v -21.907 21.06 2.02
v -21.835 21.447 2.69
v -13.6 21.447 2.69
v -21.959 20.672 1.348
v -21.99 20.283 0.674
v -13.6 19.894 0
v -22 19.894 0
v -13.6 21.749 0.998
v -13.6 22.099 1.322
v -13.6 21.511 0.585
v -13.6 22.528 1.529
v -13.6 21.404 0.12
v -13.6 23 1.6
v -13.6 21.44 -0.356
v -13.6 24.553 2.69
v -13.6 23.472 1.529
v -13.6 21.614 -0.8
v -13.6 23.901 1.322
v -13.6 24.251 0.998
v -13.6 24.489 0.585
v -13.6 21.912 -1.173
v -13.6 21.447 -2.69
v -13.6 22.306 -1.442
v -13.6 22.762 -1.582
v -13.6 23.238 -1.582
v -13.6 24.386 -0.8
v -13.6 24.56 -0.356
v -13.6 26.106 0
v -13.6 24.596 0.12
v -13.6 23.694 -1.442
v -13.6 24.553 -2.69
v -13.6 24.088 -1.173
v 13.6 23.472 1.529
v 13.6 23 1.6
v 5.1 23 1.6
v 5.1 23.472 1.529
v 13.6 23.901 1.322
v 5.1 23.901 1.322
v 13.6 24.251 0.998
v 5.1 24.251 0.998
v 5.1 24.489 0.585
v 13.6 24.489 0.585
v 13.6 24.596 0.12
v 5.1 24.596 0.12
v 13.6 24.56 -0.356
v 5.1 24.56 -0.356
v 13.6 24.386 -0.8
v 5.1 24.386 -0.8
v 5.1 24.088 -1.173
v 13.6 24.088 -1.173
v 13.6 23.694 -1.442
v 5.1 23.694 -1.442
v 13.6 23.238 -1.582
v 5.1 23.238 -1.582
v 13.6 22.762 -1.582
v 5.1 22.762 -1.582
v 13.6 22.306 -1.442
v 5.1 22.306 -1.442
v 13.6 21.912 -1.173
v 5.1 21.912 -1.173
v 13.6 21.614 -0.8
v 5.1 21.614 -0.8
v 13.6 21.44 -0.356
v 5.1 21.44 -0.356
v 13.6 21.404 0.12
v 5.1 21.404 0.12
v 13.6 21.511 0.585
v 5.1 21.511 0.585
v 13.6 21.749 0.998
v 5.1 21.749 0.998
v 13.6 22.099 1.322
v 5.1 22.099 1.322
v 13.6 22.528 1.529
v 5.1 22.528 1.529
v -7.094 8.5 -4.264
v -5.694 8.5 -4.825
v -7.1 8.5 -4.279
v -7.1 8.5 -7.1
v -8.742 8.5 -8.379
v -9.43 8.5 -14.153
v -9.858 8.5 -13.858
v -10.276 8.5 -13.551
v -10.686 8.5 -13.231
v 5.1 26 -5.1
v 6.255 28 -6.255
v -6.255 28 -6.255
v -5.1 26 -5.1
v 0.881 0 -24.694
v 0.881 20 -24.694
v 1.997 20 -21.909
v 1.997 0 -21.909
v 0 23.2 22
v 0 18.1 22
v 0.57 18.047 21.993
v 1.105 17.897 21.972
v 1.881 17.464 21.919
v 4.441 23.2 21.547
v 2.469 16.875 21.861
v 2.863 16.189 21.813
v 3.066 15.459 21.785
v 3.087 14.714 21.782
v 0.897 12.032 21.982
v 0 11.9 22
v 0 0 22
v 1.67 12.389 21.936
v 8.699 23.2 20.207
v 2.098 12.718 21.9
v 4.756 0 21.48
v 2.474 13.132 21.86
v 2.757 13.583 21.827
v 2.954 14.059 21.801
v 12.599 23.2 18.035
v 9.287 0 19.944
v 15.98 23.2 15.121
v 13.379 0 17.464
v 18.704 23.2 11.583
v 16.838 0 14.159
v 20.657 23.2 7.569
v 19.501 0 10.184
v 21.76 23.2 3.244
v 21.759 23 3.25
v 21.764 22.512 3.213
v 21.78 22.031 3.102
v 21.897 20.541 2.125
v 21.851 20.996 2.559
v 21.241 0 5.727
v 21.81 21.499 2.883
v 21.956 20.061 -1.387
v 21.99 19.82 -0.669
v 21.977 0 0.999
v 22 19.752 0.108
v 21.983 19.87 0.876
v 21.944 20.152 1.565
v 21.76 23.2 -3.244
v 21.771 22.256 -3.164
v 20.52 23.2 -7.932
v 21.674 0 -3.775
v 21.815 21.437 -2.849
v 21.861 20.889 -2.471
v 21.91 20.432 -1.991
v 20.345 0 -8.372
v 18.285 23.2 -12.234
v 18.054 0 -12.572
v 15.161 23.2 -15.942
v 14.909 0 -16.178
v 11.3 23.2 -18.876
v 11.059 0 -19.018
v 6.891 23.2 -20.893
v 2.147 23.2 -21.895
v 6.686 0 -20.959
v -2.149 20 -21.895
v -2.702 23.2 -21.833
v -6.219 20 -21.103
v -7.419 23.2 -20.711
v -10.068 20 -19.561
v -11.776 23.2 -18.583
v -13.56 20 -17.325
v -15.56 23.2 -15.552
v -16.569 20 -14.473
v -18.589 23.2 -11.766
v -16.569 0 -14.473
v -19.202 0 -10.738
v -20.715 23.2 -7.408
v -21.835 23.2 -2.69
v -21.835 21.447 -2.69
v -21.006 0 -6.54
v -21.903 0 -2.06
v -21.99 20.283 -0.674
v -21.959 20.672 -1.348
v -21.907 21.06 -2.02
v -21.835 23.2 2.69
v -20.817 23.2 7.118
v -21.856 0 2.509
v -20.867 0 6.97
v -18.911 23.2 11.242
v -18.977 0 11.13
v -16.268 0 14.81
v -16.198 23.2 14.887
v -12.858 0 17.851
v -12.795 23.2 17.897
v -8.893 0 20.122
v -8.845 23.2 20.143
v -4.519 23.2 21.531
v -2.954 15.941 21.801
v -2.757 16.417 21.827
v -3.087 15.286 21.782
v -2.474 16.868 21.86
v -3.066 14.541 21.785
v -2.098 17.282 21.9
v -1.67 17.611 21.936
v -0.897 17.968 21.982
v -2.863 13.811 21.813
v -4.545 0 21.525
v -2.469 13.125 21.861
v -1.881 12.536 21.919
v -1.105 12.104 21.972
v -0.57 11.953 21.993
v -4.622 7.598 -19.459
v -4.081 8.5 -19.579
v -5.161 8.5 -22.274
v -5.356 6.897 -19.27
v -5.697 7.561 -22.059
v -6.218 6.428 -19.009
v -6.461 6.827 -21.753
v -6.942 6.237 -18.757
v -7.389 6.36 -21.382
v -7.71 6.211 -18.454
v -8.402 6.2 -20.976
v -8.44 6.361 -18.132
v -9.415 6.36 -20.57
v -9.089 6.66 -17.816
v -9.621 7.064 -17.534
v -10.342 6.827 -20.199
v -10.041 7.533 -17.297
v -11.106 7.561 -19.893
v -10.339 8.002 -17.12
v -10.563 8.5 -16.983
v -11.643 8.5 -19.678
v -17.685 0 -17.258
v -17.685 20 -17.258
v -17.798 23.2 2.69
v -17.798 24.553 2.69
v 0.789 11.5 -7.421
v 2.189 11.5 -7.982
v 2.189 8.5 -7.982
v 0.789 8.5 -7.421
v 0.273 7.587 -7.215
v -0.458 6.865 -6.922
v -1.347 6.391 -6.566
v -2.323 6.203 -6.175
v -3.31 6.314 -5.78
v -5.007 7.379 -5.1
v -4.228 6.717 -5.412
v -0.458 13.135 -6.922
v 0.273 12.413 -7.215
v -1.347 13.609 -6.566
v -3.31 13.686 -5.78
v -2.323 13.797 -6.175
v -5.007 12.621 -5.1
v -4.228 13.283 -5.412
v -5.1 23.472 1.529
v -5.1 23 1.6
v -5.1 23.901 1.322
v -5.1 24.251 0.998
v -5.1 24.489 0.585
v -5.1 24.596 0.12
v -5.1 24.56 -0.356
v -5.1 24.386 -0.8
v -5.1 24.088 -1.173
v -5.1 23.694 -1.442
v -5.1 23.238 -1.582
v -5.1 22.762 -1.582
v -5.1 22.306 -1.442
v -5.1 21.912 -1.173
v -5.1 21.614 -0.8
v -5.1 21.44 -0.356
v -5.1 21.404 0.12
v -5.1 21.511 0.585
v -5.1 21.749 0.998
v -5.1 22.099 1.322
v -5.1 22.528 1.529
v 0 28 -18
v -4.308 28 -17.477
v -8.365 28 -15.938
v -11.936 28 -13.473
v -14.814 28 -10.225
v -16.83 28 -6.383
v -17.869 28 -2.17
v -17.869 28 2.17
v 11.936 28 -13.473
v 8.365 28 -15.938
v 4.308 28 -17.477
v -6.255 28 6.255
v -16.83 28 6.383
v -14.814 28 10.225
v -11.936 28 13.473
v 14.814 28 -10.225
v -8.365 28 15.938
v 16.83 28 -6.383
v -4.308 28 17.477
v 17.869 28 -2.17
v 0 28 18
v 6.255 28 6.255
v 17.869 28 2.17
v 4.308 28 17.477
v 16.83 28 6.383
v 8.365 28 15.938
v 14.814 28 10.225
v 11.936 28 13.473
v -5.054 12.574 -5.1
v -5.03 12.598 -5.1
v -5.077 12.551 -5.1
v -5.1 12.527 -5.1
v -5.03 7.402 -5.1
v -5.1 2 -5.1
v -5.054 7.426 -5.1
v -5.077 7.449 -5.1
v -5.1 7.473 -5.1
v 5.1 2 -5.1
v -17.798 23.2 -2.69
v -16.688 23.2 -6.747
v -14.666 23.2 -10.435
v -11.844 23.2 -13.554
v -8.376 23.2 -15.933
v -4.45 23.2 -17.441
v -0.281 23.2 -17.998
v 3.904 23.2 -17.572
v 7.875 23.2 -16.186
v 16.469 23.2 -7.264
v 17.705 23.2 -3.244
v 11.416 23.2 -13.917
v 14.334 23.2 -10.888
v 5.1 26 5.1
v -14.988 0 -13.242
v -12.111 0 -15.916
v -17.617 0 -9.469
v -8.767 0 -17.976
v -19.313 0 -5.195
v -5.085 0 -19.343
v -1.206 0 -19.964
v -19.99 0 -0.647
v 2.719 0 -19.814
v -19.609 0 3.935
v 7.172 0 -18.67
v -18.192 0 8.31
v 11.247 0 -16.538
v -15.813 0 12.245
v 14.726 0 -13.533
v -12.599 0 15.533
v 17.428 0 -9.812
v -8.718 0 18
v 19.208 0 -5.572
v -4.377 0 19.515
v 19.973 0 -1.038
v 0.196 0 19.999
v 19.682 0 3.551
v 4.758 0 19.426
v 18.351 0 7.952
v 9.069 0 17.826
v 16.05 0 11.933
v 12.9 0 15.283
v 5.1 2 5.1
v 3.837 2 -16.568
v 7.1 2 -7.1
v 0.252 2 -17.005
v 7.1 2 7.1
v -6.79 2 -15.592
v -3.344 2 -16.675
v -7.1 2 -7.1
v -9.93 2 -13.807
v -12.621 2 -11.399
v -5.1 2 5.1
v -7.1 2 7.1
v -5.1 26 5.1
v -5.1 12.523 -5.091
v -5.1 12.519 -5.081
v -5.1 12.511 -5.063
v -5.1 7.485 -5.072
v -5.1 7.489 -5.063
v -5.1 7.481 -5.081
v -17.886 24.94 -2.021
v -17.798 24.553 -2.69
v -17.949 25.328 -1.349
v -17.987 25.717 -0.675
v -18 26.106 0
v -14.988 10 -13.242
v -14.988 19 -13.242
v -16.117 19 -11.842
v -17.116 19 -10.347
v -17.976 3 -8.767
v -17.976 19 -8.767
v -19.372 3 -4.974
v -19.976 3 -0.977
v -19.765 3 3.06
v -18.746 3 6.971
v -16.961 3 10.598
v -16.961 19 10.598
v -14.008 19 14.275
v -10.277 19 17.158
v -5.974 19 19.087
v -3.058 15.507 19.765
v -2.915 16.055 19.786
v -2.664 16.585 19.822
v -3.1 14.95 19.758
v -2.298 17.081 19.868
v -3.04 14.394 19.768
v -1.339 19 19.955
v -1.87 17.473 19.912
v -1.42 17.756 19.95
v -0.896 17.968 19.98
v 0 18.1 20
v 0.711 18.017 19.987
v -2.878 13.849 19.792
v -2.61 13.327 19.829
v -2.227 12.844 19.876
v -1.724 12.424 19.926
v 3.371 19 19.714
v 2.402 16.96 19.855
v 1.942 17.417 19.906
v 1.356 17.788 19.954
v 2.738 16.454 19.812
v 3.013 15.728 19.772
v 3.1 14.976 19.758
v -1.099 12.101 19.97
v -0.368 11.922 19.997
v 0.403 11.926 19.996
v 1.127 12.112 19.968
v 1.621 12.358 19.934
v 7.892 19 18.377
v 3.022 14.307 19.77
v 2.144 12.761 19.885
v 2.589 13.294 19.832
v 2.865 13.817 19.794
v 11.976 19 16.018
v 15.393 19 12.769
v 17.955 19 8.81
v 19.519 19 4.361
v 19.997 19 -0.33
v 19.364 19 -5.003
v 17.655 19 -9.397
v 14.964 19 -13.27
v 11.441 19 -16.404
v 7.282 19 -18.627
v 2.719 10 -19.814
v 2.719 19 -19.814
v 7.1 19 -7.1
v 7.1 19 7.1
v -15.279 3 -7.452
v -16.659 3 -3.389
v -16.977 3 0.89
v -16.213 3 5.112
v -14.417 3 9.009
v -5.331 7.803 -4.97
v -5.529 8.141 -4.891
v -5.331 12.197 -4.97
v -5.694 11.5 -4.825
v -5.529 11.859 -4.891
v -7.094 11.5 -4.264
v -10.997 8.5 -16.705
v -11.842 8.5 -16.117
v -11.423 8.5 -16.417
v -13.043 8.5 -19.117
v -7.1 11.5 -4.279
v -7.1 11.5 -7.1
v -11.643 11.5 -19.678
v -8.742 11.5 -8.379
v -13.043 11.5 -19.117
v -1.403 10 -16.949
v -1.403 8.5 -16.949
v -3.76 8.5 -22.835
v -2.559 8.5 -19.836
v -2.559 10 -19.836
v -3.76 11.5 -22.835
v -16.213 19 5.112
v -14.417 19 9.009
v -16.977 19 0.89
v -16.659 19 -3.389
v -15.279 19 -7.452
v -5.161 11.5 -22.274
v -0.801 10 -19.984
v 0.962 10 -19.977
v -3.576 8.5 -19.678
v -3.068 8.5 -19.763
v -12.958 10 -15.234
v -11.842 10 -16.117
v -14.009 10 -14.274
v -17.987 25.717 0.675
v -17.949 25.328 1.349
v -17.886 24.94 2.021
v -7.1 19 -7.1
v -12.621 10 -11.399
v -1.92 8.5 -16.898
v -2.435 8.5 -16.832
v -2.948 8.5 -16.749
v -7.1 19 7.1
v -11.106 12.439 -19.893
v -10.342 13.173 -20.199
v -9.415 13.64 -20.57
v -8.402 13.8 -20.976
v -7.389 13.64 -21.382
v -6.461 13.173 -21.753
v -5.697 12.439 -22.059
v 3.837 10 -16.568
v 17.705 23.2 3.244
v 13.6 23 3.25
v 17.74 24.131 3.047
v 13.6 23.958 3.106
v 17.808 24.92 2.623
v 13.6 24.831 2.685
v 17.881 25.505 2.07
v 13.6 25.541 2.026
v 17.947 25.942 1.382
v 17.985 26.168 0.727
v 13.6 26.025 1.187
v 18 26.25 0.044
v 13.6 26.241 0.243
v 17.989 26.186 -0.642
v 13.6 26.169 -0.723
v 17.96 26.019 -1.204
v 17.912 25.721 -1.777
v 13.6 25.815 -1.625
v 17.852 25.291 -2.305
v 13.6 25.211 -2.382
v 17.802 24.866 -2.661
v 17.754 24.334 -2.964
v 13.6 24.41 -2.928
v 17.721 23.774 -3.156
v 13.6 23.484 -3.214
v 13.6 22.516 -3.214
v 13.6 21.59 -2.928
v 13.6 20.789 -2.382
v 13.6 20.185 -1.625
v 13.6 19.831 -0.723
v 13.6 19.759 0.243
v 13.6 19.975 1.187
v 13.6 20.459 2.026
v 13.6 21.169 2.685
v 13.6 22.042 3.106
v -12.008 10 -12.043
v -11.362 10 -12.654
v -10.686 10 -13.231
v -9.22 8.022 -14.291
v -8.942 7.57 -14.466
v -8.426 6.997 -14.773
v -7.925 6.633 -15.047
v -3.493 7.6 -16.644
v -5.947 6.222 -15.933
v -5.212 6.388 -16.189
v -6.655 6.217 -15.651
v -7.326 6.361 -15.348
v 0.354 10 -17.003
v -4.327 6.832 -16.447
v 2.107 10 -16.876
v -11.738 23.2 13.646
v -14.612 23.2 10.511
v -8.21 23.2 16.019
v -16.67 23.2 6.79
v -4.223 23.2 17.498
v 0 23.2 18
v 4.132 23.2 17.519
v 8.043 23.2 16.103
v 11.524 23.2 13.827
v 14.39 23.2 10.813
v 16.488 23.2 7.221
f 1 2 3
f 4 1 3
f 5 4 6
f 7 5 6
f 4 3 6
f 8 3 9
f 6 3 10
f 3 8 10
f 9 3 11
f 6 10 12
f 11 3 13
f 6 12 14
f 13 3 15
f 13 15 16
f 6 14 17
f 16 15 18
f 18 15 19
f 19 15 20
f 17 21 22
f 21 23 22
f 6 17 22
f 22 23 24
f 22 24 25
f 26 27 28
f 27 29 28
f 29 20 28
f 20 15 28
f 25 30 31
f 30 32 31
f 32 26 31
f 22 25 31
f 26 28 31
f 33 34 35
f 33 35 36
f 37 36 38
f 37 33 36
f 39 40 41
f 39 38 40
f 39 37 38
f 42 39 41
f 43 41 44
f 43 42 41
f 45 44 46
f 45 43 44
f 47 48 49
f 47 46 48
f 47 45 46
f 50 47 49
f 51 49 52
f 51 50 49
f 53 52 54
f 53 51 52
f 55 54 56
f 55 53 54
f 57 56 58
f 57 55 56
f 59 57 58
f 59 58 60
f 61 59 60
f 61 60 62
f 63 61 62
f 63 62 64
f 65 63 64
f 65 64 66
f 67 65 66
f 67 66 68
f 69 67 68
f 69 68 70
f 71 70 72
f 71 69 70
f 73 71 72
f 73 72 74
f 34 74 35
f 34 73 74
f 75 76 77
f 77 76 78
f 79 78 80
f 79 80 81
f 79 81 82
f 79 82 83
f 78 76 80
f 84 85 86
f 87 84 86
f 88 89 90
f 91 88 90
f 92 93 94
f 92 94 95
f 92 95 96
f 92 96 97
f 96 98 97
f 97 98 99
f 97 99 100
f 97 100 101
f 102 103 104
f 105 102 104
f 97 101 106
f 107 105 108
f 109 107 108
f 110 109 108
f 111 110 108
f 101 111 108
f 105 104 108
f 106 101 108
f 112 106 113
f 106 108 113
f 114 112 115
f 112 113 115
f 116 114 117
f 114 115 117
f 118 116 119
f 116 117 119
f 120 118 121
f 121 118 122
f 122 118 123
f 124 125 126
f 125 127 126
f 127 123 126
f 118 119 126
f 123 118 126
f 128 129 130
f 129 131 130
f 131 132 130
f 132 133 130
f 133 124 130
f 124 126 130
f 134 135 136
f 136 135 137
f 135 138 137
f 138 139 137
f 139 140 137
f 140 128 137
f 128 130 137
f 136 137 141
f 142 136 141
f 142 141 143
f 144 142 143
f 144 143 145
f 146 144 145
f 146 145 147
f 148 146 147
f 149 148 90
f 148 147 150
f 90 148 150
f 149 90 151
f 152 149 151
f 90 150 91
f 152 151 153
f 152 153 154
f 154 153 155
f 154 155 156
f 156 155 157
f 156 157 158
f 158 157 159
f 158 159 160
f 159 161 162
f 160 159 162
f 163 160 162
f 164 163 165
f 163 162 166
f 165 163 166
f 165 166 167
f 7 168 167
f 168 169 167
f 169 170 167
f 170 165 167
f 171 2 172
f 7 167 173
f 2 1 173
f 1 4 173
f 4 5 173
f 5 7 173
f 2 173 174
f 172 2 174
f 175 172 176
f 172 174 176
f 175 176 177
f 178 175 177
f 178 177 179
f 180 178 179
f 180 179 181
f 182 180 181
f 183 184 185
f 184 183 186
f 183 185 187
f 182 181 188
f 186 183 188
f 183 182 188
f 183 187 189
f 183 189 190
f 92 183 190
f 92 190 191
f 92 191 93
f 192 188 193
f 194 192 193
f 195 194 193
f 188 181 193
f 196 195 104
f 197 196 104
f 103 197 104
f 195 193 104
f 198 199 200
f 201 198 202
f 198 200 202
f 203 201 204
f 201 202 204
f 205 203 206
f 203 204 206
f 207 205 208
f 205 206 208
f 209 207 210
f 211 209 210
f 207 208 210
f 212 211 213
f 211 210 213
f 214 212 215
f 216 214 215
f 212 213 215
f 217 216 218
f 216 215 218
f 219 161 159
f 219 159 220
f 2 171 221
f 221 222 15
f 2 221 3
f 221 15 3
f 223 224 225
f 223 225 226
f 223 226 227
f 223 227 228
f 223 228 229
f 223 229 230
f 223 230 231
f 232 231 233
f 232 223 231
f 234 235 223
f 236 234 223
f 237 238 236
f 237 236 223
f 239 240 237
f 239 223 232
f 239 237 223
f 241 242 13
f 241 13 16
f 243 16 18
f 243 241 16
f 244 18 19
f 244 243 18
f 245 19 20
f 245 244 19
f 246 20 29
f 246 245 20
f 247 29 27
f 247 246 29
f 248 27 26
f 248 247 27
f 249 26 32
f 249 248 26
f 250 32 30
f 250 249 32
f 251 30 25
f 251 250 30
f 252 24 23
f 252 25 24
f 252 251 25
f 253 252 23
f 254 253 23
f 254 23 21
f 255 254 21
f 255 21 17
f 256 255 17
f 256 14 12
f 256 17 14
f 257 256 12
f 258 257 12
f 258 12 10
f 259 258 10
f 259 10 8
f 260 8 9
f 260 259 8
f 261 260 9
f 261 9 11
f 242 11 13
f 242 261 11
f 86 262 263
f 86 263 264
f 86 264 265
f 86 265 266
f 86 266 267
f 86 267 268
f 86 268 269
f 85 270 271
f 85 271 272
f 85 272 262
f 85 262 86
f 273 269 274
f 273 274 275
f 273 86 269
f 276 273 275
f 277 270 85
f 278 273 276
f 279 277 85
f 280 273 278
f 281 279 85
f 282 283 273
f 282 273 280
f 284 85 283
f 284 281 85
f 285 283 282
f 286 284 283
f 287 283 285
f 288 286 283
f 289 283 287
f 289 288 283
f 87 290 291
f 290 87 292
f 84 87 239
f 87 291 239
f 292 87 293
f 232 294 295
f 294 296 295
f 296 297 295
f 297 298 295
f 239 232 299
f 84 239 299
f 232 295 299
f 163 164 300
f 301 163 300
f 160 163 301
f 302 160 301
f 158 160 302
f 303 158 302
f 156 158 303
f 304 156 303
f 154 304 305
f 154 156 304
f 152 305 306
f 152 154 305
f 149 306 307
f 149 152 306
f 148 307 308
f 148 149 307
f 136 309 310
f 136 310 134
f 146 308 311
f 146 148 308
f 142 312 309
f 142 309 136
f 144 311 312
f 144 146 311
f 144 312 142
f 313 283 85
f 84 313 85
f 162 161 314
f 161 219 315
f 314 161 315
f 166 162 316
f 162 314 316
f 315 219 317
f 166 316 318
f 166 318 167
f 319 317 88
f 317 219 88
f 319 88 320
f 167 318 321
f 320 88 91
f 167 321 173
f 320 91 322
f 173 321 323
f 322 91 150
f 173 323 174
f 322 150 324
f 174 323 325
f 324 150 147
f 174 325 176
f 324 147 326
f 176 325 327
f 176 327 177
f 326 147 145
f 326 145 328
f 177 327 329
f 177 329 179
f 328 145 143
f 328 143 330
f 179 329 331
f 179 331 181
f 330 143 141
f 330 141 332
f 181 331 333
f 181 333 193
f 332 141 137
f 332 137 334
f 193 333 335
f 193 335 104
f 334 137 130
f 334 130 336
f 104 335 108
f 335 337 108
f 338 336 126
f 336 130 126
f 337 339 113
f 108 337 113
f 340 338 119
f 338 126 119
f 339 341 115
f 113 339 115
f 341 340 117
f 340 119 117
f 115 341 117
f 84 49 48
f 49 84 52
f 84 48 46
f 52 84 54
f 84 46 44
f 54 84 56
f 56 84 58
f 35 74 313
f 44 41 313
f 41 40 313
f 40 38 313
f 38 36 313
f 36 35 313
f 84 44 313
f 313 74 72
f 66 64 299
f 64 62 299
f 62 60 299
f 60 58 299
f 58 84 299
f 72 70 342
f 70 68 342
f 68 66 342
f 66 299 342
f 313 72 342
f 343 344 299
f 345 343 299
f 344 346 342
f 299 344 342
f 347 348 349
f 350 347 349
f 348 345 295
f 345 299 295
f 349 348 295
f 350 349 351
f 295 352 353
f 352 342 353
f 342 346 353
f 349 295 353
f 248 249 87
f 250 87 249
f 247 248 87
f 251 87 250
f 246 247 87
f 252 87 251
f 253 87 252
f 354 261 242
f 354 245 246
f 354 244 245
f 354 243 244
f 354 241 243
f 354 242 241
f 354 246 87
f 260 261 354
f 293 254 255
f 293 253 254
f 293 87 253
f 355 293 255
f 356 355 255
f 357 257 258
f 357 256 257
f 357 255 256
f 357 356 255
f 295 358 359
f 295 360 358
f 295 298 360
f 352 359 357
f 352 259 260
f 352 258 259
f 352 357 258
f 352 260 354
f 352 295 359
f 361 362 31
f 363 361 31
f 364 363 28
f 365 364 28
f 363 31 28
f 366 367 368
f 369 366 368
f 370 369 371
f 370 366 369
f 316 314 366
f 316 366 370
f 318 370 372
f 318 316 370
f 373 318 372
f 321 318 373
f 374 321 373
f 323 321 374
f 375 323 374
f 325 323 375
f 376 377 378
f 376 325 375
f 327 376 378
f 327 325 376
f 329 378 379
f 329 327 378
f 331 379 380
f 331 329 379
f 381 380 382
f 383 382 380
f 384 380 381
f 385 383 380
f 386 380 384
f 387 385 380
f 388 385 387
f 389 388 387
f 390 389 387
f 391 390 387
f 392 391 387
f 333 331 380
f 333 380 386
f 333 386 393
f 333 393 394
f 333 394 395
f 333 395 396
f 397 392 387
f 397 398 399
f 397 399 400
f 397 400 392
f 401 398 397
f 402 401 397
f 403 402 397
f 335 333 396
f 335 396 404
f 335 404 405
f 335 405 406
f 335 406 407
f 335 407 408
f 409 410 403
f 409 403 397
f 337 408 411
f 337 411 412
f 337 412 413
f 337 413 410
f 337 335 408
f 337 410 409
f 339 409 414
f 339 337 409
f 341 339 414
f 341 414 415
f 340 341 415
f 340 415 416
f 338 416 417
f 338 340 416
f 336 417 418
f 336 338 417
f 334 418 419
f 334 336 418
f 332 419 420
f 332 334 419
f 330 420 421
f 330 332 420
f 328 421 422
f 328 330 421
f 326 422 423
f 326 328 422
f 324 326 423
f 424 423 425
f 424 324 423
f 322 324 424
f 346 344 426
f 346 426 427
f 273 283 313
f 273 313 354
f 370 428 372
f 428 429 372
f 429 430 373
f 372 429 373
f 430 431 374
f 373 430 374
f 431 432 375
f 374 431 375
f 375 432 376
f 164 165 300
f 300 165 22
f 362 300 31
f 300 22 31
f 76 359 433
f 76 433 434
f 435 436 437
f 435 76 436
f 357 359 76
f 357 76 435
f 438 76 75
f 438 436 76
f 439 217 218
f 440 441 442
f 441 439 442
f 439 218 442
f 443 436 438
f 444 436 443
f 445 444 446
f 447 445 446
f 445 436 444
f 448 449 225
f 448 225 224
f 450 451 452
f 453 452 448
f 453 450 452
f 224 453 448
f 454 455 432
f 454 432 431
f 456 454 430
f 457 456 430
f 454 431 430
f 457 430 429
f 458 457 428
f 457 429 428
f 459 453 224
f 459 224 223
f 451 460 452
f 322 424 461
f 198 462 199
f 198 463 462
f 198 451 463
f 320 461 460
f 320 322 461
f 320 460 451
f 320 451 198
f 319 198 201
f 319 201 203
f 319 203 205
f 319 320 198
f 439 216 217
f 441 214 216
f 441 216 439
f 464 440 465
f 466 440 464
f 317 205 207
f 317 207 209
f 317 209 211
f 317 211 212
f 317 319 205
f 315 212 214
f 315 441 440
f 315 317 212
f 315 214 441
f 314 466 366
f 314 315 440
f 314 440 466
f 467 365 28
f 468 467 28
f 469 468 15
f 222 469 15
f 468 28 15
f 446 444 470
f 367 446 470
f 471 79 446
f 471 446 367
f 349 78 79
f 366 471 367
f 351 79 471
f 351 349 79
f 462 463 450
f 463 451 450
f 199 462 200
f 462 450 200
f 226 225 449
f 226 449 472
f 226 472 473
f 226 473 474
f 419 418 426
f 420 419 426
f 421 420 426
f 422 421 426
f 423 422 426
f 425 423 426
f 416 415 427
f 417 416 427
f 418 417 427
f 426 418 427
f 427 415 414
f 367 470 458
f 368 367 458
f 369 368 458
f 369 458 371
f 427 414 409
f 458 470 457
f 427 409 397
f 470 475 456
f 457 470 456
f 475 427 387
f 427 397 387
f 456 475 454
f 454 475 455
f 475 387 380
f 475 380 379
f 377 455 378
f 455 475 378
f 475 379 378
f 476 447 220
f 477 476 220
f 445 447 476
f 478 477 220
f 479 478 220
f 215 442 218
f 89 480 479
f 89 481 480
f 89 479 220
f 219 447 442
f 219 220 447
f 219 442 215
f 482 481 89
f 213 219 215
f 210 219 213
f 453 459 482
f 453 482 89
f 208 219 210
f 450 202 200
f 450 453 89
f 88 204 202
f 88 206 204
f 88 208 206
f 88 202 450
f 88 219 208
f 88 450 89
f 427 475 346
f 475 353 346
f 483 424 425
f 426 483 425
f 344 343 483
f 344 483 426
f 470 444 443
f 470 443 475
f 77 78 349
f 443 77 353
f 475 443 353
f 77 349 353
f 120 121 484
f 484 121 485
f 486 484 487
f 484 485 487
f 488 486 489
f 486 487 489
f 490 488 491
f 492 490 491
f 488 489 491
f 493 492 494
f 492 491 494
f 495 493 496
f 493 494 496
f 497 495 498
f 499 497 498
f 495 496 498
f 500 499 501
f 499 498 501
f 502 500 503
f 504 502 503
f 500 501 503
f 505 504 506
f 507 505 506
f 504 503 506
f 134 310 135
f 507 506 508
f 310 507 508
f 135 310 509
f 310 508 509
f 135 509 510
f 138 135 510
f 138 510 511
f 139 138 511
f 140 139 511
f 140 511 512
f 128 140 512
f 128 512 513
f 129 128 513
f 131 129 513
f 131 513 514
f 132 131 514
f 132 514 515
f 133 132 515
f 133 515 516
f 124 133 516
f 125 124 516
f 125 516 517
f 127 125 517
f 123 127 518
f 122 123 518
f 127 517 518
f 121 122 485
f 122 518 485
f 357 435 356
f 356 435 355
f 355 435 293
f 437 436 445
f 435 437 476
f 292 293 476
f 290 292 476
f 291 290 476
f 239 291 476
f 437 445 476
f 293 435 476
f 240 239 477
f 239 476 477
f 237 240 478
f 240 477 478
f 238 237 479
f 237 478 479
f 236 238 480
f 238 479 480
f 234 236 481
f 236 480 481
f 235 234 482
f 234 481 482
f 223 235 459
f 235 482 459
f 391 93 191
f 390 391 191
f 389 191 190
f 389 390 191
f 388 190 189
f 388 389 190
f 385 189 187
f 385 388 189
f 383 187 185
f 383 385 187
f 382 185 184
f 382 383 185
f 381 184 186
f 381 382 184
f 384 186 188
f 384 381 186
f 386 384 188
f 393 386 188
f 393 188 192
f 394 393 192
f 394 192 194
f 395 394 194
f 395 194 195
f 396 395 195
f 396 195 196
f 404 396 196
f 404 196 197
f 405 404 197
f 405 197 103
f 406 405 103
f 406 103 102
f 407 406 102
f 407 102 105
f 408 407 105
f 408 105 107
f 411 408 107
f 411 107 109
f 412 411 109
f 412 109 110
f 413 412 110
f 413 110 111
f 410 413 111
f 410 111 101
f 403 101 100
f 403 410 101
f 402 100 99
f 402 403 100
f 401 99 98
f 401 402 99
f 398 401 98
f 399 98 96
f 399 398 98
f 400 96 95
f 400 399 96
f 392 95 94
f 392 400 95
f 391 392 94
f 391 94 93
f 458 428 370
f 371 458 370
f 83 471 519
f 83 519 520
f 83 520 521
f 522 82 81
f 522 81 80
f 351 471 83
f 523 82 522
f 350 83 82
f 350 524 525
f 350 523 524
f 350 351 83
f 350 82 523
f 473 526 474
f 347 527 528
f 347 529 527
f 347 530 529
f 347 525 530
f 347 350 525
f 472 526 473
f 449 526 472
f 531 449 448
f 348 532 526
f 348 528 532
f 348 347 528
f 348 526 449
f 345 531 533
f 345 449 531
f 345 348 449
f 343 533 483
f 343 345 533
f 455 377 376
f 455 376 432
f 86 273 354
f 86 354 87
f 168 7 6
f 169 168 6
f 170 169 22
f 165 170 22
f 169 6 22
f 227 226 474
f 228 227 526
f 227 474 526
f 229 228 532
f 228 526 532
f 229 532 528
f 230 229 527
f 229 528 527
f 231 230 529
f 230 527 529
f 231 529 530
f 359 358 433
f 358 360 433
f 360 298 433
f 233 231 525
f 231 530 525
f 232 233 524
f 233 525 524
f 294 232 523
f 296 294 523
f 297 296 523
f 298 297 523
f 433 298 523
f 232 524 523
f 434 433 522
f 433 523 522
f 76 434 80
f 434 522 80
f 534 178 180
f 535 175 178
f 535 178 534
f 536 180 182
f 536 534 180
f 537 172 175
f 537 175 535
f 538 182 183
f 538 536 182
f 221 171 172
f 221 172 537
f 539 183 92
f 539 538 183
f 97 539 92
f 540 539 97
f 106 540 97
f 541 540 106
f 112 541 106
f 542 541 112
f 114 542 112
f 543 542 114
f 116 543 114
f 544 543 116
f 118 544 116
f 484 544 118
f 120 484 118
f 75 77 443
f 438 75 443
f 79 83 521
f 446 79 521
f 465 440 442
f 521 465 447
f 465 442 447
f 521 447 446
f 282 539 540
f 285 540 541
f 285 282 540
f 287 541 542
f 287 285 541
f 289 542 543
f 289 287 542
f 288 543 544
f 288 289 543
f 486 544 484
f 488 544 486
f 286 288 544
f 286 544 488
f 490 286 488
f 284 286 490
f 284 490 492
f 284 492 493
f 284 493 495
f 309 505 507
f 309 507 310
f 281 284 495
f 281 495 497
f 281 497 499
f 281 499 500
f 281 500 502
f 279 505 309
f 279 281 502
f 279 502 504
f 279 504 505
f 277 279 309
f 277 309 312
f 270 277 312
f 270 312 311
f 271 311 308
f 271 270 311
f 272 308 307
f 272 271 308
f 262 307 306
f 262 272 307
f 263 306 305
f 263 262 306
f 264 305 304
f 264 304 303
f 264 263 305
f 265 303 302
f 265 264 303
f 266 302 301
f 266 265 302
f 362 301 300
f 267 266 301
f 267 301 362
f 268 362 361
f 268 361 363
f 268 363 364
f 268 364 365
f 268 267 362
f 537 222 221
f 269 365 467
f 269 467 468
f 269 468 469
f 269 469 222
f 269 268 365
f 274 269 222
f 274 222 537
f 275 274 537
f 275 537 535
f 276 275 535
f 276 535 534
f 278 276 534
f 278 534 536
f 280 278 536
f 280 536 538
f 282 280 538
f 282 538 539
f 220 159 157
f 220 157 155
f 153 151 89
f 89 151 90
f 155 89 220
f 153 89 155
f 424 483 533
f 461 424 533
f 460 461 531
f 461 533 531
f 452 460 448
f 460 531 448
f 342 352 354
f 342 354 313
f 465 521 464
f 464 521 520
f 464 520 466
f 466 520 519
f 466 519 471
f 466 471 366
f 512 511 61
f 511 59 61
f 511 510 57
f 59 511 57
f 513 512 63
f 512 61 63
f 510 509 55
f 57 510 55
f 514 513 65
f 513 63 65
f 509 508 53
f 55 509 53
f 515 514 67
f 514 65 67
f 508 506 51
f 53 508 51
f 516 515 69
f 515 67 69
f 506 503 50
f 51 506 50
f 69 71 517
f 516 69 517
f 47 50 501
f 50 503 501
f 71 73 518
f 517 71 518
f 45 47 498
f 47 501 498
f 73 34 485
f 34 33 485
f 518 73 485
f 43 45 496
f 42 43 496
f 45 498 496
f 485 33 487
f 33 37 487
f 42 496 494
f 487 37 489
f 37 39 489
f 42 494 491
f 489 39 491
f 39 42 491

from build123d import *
from OCP.BRepFilletAPI import BRepFilletAPI_MakeChamfer

# Parameters (mm, degrees)
SKETCH1_R                = 22
BOSS_EXTRUDE1_DEPTH      = 28
SKETCH2_W                = 10.2
SKETCH2_H                = 10.2
CUT_EXTRUDE2_DEPTH       = 42.856899073
SHELL3_T                 = -2
SKETCH3_R                = 3.1
CUT_EXTRUDE3_DEPTH       = 46.987063398
CHAMFER1_SIZE            = 2
CHAMFER1_SIZE2           = 1.154700538
BOSS_EXTRUDE8_START      = 23
BOSS_EXTRUDE8_DEPTH      = 23
BOSS_EXTRUDE4_DEPTH      = 20
BOSS_EXTRUDE6_DEPTH      = 26
CUT_EXTRUDE5_DEPTH       = 10
SKETCH13_R               = 3.8
CUT_EXTRUDE6_DEPTH       = 16
SKETCH15_W               = 10
SKETCH15_H               = 3
CUT_EXTRUDE8_DEPTH       = 16
CUT_EXTRUDE9_DEPTH       = 2
BOSS_EXTRUDE10_START     = 7
BOSS_EXTRUDE10_DEPTH     = 7
SKETCH21_OUTSIDE_W       = 60
SKETCH21_OUTSIDE_H       = 62.694
SKETCH21_OUTSIDE_R       = 18
CUT_EXTRUDE11_DEPTH      = 4.8
CUT_EXTRUDE12_DEPTH      = 47.132512216
CUT_EXTRUDE12_DEPTH_BACK = 47.132512216
SKETCH22_R               = 1.6
CUT_EXTRUDE13_START      = -8.5
SKETCH24_R               = 3.25
CUT_EXTRUDE13_DEPTH      = 38.632512277
CUT_EXTRUDE14_START      = -8.5
CUT_EXTRUDE14_DEPTH      = 38.632512278


with BuildPart() as part:
    # Sketch1 → Boss-Extrude1 (new body)
    with BuildSketch(Plane(origin=(0, 0, 0), x_dir=(1, 0, 0), z_dir=(0, 1, 0))):
        with Locations(Location((0, 0, 0), (0, 0, 270))):
            Circle(SKETCH1_R)
    extrude(amount=BOSS_EXTRUDE1_DEPTH)

    # Sketch2 → Cut-Extrude2 (cut, through all)
    with BuildSketch(Plane.XZ):
        Rectangle(SKETCH2_W, SKETCH2_H)
    extrude(amount=-CUT_EXTRUDE2_DEPTH, mode=Mode.SUBTRACT)

    # Shell3
    shell3_openings = [part.faces().sort_by_distance(p)[0] for p in [
        (0, 0, -21.377746033),
    ]]
    offset(amount=SHELL3_T, openings=shell3_openings, kind=Kind.INTERSECTION)

    # Sketch3 → Cut-Extrude3 (cut, through all)
    with BuildSketch(Plane.XY.offset(7.1)):
        with Locations(Location((0, 15, 0), (0, 0, 90.000000051))):
            Circle(SKETCH3_R)
    extrude(amount=CUT_EXTRUDE3_DEPTH, mode=Mode.SUBTRACT)

    # Chamfer1: one chamfer whose edges measure the first distance from different faces: ONE call of the kernel's chamfer builder (chamfer() names one face for all edges)
    chamfer1_edges_1 = [part.edges().sort_by_distance(p)[0] for p in [
        (5.1, 28, 0),
    ]]
    chamfer1_side_1 = [part.faces().sort_by_distance(p)[0] for p in [
        (5.1, 14, 0),
    ]]
    chamfer1_edges_2 = [part.edges().sort_by_distance(p)[0] for p in [
        (0, 28, -5.1),
    ]]
    chamfer1_side_2 = [part.faces().sort_by_distance(p)[0] for p in [
        (0, 14, -5.1),
    ]]
    chamfer1_edges_3 = [part.edges().sort_by_distance(p)[0] for p in [
        (-5.1, 28, 0),
    ]]
    chamfer1_side_3 = [part.faces().sort_by_distance(p)[0] for p in [
        (-5.1, 14, 0),
    ]]
    chamfer1_edges_4 = [part.edges().sort_by_distance(p)[0] for p in [
        (0, 28, 5.1),
    ]]
    chamfer1_side_4 = [part.faces().sort_by_distance(p)[0] for p in [
        (0, 14, 5.1),
    ]]
    chamfer1 = BRepFilletAPI_MakeChamfer(part.part.solid().wrapped)
    for e in chamfer1_edges_1:
        chamfer1.Add(CHAMFER1_SIZE, CHAMFER1_SIZE2, e.wrapped, chamfer1_side_1[0].wrapped)  # the first distance lies on this face
    for e in chamfer1_edges_2:
        chamfer1.Add(CHAMFER1_SIZE, CHAMFER1_SIZE2, e.wrapped, chamfer1_side_2[0].wrapped)  # the first distance lies on this face
    for e in chamfer1_edges_3:
        chamfer1.Add(CHAMFER1_SIZE, CHAMFER1_SIZE2, e.wrapped, chamfer1_side_3[0].wrapped)  # the first distance lies on this face
    for e in chamfer1_edges_4:
        chamfer1.Add(CHAMFER1_SIZE, CHAMFER1_SIZE2, e.wrapped, chamfer1_side_4[0].wrapped)  # the first distance lies on this face
    add(Compound.cast(chamfer1.Shape()), mode=Mode.REPLACE)

    # Sketch18 → Boss-Extrude8 (add)
    with BuildSketch(Plane.XZ.offset(-26).offset(BOSS_EXTRUDE8_START)):
        with BuildLine():
            Line((-15.279498787, -7.452309495), (-17.975880926, -8.767422936))
            ThreePointArc((-17.975880926, -8.767422936), (-19.972590695, 1.046719125), (-16.960961923, 10.598385285))
            Line((-16.960961923, 10.598385285), (-14.416817635, 9.008627492))
            ThreePointArc((-14.416817635, 9.008627492), (-16.976702091, 0.889711256), (-15.279498787, -7.452309495))
        make_face()
    extrude(amount=-BOSS_EXTRUDE8_DEPTH)

    # Sketch9 → Boss-Extrude4 (add)
    with BuildSketch(Plane.XZ):
        Polygon((1.996845621, -21.909190025), (-16.569234798, -14.472748814), (-17.684700979, -17.257660876), (0.881379439, -24.694102088), align=None)
    extrude(amount=-BOSS_EXTRUDE4_DEPTH)

    # Sketch11 → Boss-Extrude6 (add)
    with BuildSketch(Plane.XZ):
        with BuildLine():
            Line((1.996845621, -21.909190025), (7.1, -7.1))
            Line((7.1, -7.1), (-7.1, -7.1))
            Line((-7.1, -7.1), (-16.569234798, -14.472748814))
            ThreePointArc((-16.569234798, -14.472748814), (-8.180085333, -20.42268846), (1.996845621, -21.909190025))
        make_face()
    extrude(amount=-BOSS_EXTRUDE6_DEPTH)

    # Sketch12 → Cut-Extrude5 (cut)
    with BuildSketch(Plane.XZ):
        with BuildLine():
            Line((3.837309235, -16.568223759), (2.718713258, -19.814353338))
            ThreePointArc((2.718713258, -19.814353338), (-6.959564044, -18.750052488), (-14.988393562, -13.241905393))
            Line((-14.988393562, -13.241905393), (-12.621280739, -11.398870699))
            ThreePointArc((-12.621280739, -11.398870699), (-5.096085911, -16.225316302), (3.837309235, -16.568223759))
        make_face()
    extrude(amount=-CUT_EXTRUDE5_DEPTH, mode=Mode.SUBTRACT)

    # Sketch13 → Cut-Extrude6 (cut)
    with BuildSketch(Plane(origin=(-8.40166077, 0, -20.975881482), x_dir=(-0.9283040209233338, 0, 0.3718220605848592), z_dir=(-0.3718220605848592, 0, -0.9283040209233338))):
        with Locations((0, 10)):
            Circle(SKETCH13_R)
    extrude(amount=-CUT_EXTRUDE6_DEPTH, mode=Mode.SUBTRACT)

    # Sketch15 → Cut-Extrude8 (cut)
    with BuildSketch(Plane(origin=(-8.40166077, 0, -20.975881482), x_dir=(-0.9283040209233339, 0, 0.37182206058485906), z_dir=(-0.37182206058485906, 0, -0.9283040209233339))):
        with Locations((0, 10)):
            Rectangle(SKETCH15_W, SKETCH15_H)
    extrude(amount=-CUT_EXTRUDE8_DEPTH, mode=Mode.SUBTRACT)

    # Sketch17 → Cut-Extrude9 (cut)
    with BuildSketch(Plane.XZ):
        with BuildLine():
            Line((7.1, 7.1), (7.1, -7.1))
            Line((7.1, -7.1), (3.837309235, -16.568223759))
            ThreePointArc((3.837309235, -16.568223759), (-5.096085911, -16.225316302), (-12.621280739, -11.398870699))
            Line((-12.621280739, -11.398870699), (-7.1, -7.1))
            Line((-7.1, -7.1), (-7.1, 7.1))
            Line((-7.1, 7.1), (7.1, 7.1))
        make_face()
    extrude(amount=-CUT_EXTRUDE9_DEPTH, mode=Mode.SUBTRACT)

    # Sketch20 → Boss-Extrude10 (add)
    with BuildSketch(Plane.XZ.offset(-26).offset(BOSS_EXTRUDE10_START)):
        with BuildLine():
            Line((2.718713258, -19.814353338), (7.1, -7.1))
            Line((7.1, -7.1), (7.1, 7.1))
            Line((7.1, 7.1), (-7.1, 7.1))
            Line((-7.1, 7.1), (-7.1, -7.1))
            Line((-7.1, -7.1), (-14.988393562, -13.241905393))
            ThreePointArc((-14.988393562, -13.241905393), (6.959564044, 18.750052488), (2.718713258, -19.814353338))
        make_face()
    extrude(amount=-BOSS_EXTRUDE10_DEPTH)

    # Sketch21 outside → Cut-Extrude11 (cut)
    with BuildSketch(Plane(origin=(0, 28, 0), x_dir=(1, 0, 0), z_dir=(0, 1, 0))):
        with Locations((0, 1.347)):
            Rectangle(SKETCH21_OUTSIDE_W, SKETCH21_OUTSIDE_H)
        with Locations(Location((0, 0, 0), (0, 0, 270))):
            Circle(SKETCH21_OUTSIDE_R, mode=Mode.SUBTRACT)
    extrude(amount=-CUT_EXTRUDE11_DEPTH, mode=Mode.SUBTRACT)

    # Sketch22 → Cut-Extrude12 (cut, two sides: drawn at the far end of the back side and taken through both)
    with BuildSketch(Plane.ZY.offset(-5.1).offset(-CUT_EXTRUDE12_DEPTH_BACK)):
        with Locations((0, 23)):
            Circle(SKETCH22_R)
    extrude(amount=CUT_EXTRUDE12_DEPTH + CUT_EXTRUDE12_DEPTH_BACK, mode=Mode.SUBTRACT)

    # Sketch24 → Cut-Extrude13 (cut, through all)
    with BuildSketch(Plane.ZY.offset(-5.1).offset(CUT_EXTRUDE13_START)):
        with Locations((0, 23)):
            Circle(SKETCH24_R)
    extrude(amount=-CUT_EXTRUDE13_DEPTH, mode=Mode.SUBTRACT)

    # Sketch25 → Cut-Extrude14 (cut, through all)
    with BuildSketch(Plane(origin=(-5.1, 0, 0), x_dir=(0, 0, -1), z_dir=(1, 0, 0)).offset(CUT_EXTRUDE14_START)):
        Polygon((0, 19.893553151), (2.690261887, 21.446776575), (2.690261887, 24.553223425), (0, 26.106446849), (-2.690261887, 24.553223425), (-2.690261887, 21.446776575), align=None)
    extrude(amount=-CUT_EXTRUDE14_DEPTH, mode=Mode.SUBTRACT)


solid = part.part
